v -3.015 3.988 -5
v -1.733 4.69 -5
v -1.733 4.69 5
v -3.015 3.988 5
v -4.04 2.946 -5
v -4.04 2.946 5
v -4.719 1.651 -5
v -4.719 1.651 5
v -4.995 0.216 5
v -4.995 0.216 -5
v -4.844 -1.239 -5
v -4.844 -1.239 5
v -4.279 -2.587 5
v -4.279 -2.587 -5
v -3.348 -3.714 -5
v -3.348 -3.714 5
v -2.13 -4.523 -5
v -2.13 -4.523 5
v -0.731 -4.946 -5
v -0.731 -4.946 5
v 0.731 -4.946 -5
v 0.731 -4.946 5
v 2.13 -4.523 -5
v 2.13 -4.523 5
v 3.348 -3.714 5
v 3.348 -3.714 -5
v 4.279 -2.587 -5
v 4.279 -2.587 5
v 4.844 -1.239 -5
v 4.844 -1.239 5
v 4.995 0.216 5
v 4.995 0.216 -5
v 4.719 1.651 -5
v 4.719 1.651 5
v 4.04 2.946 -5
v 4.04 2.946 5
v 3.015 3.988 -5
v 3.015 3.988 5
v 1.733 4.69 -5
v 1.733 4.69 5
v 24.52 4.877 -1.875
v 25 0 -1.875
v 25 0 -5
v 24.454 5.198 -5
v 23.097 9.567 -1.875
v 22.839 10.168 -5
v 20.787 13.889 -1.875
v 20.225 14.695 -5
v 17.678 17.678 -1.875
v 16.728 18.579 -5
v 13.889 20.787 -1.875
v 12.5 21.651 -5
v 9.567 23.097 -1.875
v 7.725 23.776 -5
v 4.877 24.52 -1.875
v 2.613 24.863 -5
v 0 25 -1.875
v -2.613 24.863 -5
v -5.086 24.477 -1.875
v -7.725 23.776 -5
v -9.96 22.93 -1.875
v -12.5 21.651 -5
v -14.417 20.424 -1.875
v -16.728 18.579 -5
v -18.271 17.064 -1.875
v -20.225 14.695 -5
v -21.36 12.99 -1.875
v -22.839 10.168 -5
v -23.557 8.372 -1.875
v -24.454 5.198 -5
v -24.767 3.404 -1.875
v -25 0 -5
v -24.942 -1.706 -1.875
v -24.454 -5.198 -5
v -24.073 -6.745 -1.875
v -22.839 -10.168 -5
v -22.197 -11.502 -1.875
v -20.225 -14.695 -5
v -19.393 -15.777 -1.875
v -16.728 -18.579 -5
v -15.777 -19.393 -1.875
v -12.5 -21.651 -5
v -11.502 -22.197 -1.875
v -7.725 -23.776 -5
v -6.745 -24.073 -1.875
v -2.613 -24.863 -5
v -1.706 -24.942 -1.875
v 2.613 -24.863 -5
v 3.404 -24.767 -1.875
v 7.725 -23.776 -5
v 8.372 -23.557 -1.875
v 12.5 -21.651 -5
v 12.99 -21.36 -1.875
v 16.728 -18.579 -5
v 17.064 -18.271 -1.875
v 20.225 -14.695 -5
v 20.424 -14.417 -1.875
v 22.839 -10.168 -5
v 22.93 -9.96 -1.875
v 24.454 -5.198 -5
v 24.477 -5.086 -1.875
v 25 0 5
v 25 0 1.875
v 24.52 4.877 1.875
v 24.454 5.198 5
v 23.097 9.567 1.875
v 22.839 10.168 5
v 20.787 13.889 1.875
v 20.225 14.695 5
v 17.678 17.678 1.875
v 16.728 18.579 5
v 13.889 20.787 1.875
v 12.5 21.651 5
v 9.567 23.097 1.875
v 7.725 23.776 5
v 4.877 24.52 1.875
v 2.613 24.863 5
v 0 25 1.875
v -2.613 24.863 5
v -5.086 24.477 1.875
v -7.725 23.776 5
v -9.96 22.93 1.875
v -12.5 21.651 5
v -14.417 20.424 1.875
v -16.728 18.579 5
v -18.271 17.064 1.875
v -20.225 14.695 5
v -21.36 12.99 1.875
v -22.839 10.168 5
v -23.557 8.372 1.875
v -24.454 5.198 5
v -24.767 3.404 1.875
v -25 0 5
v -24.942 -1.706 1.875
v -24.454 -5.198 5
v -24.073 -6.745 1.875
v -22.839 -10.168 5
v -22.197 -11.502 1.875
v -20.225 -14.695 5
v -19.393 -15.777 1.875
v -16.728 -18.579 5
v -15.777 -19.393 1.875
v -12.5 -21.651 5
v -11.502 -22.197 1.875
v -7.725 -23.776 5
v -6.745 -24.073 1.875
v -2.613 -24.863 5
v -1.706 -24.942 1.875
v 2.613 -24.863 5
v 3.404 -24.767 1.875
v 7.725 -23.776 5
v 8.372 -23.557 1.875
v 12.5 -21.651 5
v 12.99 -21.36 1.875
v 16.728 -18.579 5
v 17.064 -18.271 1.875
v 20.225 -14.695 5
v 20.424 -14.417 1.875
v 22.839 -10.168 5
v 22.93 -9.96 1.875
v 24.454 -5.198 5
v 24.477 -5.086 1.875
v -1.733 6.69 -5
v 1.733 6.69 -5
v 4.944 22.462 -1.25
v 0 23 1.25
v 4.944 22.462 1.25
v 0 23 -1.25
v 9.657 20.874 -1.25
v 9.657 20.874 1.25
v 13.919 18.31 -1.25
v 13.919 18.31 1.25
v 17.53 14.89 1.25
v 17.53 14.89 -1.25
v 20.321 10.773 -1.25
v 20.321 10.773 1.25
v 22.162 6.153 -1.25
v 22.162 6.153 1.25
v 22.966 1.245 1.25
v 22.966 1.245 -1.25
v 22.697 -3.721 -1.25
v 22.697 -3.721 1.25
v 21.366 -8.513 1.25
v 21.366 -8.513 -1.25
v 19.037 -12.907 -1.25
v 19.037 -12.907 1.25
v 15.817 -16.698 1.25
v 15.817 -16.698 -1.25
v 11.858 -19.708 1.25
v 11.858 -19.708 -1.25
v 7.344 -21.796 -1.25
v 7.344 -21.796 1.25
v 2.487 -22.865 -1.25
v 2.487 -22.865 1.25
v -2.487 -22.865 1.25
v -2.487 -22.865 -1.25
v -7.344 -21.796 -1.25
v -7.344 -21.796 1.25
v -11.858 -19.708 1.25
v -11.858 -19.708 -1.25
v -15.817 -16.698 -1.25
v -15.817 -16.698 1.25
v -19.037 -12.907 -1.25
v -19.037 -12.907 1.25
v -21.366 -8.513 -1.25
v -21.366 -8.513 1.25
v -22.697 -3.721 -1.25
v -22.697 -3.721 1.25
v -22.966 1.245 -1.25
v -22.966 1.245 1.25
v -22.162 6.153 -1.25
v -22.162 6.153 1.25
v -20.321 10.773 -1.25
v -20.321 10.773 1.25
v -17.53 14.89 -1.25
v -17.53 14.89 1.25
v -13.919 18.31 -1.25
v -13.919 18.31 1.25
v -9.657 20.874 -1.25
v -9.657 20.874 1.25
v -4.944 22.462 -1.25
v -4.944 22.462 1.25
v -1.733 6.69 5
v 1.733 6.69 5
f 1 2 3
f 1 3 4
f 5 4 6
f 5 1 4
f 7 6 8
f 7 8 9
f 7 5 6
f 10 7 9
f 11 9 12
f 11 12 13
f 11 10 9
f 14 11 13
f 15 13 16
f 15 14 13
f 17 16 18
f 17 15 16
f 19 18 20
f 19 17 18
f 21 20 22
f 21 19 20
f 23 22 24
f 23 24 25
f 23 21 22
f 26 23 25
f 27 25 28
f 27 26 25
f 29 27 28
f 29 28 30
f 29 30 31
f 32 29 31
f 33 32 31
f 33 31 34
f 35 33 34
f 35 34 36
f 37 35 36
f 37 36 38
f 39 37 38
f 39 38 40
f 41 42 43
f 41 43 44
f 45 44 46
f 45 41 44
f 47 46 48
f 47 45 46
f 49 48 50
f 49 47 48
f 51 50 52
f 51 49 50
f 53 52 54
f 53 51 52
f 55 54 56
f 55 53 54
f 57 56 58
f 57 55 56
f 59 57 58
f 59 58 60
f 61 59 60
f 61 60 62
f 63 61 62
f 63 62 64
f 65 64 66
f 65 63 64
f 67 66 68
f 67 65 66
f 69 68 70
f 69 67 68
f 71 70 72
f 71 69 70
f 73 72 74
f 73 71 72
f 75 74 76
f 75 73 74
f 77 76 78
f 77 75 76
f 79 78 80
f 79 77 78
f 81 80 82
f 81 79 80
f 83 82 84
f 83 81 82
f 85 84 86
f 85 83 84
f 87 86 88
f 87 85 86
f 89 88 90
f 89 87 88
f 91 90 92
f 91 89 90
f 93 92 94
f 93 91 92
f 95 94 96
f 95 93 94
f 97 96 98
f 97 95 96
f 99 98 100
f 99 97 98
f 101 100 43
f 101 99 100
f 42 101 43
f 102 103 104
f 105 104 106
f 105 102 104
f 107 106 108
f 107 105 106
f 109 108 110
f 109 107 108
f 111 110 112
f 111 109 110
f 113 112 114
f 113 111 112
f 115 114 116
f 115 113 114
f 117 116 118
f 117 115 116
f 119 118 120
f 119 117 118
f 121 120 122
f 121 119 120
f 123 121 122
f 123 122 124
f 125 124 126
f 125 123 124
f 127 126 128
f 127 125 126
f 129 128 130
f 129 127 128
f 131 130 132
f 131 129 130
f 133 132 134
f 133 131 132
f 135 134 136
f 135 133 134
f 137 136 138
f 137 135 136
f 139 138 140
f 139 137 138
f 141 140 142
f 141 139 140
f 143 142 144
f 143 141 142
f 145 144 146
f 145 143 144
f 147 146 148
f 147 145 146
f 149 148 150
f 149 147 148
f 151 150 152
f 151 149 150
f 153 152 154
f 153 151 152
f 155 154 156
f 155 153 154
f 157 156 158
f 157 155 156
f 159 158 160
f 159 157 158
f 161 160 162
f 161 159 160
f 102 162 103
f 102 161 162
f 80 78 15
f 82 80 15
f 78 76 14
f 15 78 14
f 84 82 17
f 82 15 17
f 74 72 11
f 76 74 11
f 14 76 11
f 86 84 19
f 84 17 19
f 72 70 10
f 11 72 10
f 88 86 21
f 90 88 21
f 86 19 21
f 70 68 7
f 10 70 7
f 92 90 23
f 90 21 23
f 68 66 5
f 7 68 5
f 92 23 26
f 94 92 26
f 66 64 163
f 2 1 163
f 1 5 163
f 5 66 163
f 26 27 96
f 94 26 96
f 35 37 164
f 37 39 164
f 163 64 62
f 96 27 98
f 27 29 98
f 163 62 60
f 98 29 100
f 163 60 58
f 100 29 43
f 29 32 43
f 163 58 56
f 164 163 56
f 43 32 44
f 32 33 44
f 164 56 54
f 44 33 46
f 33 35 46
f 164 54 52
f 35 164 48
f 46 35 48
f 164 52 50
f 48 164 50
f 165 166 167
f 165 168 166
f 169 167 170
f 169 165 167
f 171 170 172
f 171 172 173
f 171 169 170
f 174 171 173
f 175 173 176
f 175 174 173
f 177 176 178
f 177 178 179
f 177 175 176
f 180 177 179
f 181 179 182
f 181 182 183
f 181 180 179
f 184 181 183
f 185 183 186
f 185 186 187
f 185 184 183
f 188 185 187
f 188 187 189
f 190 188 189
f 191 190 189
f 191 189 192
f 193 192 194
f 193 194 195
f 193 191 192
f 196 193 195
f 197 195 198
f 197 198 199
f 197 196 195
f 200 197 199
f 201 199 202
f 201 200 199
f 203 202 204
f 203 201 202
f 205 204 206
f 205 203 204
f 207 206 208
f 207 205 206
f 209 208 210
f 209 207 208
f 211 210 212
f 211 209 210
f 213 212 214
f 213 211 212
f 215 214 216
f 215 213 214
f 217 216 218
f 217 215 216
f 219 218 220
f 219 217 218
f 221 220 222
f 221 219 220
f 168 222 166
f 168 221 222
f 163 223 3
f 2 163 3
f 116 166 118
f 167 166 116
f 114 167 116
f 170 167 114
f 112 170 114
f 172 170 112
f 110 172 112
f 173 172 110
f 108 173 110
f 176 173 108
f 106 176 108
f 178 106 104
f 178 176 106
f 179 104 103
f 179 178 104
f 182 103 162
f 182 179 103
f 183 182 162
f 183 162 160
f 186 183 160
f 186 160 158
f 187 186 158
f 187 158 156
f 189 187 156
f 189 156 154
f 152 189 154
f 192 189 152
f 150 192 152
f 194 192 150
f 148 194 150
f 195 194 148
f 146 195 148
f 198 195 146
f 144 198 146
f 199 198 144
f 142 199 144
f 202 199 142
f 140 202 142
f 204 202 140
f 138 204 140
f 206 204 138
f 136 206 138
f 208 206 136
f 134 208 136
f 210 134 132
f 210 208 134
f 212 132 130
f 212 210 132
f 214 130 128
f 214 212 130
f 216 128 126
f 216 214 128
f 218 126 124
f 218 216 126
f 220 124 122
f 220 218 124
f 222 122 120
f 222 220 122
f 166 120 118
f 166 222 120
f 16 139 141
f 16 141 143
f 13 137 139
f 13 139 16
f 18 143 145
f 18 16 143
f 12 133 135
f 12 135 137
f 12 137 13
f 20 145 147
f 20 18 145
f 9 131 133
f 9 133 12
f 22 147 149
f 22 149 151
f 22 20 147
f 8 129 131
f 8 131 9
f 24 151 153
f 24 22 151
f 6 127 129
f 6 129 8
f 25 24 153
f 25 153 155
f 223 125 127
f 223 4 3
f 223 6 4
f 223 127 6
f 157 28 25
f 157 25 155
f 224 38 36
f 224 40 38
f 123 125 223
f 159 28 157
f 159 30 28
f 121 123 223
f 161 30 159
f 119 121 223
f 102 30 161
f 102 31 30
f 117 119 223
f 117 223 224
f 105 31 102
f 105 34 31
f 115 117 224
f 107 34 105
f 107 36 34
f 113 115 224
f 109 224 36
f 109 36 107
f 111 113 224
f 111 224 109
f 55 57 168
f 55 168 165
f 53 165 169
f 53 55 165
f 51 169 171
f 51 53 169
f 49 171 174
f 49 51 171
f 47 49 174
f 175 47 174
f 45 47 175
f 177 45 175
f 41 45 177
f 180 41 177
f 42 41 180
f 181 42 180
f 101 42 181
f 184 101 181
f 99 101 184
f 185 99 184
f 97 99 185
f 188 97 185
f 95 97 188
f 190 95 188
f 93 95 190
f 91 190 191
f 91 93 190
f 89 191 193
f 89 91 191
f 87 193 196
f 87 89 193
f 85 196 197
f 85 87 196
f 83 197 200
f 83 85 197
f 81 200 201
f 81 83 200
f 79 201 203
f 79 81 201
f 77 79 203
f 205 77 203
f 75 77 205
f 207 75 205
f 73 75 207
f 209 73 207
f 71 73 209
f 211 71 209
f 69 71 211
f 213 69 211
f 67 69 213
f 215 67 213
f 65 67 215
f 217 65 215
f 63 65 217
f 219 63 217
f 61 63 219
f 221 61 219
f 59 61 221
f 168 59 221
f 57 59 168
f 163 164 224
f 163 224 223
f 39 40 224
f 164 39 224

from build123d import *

# Parameters (mm, degrees)
SKETCH1_R           = 25
SKETCH1_R_2         = 5
BOSS_EXTRUDE1_DEPTH = 5
CUT_EXTRUDE1_DEPTH  = 10


with BuildPart() as part:
    # Sketch1 → Boss-Extrude1 (new body, symmetric)
    with BuildSketch(Plane.XY):
        Circle(SKETCH1_R)
        Circle(SKETCH1_R_2, mode=Mode.SUBTRACT)
    extrude(amount=BOSS_EXTRUDE1_DEPTH, both=True)

    # Sketch2 → Cut-Revolve1 (revolve, cut)
    with BuildSketch(Plane(origin=(0, 0, 0), x_dir=(0, 0, -1), z_dir=(1, 0, 0))):
        Polygon((-2.5, 27), (-1.25, 23), (1.25, 23), (2.5, 27), align=None)
    revolve(axis=Axis((0, 0, 14.237449017), (0, 0, -1)), mode=Mode.SUBTRACT)

    # Sketch3 → Cut-Extrude1 (cut)
    with BuildSketch(Plane(origin=(0, 0, -5), x_dir=(-1, 0, 0), z_dir=(0, 0, -1))):
        with BuildLine():
            Line((-1.732878986, 6.690109852), (1.732878986, 6.690109852))
            Line((1.732878986, 6.690109852), (1.732878986, 4.690109852))
            ThreePointArc((1.732878986, 4.690109852), (0, 5), (-1.732878986, 4.690109852))
            Line((-1.732878986, 4.690109852), (-1.732878986, 6.690109852))
        make_face()
    extrude(amount=-CUT_EXTRUDE1_DEPTH, mode=Mode.SUBTRACT)


solid = part.part
